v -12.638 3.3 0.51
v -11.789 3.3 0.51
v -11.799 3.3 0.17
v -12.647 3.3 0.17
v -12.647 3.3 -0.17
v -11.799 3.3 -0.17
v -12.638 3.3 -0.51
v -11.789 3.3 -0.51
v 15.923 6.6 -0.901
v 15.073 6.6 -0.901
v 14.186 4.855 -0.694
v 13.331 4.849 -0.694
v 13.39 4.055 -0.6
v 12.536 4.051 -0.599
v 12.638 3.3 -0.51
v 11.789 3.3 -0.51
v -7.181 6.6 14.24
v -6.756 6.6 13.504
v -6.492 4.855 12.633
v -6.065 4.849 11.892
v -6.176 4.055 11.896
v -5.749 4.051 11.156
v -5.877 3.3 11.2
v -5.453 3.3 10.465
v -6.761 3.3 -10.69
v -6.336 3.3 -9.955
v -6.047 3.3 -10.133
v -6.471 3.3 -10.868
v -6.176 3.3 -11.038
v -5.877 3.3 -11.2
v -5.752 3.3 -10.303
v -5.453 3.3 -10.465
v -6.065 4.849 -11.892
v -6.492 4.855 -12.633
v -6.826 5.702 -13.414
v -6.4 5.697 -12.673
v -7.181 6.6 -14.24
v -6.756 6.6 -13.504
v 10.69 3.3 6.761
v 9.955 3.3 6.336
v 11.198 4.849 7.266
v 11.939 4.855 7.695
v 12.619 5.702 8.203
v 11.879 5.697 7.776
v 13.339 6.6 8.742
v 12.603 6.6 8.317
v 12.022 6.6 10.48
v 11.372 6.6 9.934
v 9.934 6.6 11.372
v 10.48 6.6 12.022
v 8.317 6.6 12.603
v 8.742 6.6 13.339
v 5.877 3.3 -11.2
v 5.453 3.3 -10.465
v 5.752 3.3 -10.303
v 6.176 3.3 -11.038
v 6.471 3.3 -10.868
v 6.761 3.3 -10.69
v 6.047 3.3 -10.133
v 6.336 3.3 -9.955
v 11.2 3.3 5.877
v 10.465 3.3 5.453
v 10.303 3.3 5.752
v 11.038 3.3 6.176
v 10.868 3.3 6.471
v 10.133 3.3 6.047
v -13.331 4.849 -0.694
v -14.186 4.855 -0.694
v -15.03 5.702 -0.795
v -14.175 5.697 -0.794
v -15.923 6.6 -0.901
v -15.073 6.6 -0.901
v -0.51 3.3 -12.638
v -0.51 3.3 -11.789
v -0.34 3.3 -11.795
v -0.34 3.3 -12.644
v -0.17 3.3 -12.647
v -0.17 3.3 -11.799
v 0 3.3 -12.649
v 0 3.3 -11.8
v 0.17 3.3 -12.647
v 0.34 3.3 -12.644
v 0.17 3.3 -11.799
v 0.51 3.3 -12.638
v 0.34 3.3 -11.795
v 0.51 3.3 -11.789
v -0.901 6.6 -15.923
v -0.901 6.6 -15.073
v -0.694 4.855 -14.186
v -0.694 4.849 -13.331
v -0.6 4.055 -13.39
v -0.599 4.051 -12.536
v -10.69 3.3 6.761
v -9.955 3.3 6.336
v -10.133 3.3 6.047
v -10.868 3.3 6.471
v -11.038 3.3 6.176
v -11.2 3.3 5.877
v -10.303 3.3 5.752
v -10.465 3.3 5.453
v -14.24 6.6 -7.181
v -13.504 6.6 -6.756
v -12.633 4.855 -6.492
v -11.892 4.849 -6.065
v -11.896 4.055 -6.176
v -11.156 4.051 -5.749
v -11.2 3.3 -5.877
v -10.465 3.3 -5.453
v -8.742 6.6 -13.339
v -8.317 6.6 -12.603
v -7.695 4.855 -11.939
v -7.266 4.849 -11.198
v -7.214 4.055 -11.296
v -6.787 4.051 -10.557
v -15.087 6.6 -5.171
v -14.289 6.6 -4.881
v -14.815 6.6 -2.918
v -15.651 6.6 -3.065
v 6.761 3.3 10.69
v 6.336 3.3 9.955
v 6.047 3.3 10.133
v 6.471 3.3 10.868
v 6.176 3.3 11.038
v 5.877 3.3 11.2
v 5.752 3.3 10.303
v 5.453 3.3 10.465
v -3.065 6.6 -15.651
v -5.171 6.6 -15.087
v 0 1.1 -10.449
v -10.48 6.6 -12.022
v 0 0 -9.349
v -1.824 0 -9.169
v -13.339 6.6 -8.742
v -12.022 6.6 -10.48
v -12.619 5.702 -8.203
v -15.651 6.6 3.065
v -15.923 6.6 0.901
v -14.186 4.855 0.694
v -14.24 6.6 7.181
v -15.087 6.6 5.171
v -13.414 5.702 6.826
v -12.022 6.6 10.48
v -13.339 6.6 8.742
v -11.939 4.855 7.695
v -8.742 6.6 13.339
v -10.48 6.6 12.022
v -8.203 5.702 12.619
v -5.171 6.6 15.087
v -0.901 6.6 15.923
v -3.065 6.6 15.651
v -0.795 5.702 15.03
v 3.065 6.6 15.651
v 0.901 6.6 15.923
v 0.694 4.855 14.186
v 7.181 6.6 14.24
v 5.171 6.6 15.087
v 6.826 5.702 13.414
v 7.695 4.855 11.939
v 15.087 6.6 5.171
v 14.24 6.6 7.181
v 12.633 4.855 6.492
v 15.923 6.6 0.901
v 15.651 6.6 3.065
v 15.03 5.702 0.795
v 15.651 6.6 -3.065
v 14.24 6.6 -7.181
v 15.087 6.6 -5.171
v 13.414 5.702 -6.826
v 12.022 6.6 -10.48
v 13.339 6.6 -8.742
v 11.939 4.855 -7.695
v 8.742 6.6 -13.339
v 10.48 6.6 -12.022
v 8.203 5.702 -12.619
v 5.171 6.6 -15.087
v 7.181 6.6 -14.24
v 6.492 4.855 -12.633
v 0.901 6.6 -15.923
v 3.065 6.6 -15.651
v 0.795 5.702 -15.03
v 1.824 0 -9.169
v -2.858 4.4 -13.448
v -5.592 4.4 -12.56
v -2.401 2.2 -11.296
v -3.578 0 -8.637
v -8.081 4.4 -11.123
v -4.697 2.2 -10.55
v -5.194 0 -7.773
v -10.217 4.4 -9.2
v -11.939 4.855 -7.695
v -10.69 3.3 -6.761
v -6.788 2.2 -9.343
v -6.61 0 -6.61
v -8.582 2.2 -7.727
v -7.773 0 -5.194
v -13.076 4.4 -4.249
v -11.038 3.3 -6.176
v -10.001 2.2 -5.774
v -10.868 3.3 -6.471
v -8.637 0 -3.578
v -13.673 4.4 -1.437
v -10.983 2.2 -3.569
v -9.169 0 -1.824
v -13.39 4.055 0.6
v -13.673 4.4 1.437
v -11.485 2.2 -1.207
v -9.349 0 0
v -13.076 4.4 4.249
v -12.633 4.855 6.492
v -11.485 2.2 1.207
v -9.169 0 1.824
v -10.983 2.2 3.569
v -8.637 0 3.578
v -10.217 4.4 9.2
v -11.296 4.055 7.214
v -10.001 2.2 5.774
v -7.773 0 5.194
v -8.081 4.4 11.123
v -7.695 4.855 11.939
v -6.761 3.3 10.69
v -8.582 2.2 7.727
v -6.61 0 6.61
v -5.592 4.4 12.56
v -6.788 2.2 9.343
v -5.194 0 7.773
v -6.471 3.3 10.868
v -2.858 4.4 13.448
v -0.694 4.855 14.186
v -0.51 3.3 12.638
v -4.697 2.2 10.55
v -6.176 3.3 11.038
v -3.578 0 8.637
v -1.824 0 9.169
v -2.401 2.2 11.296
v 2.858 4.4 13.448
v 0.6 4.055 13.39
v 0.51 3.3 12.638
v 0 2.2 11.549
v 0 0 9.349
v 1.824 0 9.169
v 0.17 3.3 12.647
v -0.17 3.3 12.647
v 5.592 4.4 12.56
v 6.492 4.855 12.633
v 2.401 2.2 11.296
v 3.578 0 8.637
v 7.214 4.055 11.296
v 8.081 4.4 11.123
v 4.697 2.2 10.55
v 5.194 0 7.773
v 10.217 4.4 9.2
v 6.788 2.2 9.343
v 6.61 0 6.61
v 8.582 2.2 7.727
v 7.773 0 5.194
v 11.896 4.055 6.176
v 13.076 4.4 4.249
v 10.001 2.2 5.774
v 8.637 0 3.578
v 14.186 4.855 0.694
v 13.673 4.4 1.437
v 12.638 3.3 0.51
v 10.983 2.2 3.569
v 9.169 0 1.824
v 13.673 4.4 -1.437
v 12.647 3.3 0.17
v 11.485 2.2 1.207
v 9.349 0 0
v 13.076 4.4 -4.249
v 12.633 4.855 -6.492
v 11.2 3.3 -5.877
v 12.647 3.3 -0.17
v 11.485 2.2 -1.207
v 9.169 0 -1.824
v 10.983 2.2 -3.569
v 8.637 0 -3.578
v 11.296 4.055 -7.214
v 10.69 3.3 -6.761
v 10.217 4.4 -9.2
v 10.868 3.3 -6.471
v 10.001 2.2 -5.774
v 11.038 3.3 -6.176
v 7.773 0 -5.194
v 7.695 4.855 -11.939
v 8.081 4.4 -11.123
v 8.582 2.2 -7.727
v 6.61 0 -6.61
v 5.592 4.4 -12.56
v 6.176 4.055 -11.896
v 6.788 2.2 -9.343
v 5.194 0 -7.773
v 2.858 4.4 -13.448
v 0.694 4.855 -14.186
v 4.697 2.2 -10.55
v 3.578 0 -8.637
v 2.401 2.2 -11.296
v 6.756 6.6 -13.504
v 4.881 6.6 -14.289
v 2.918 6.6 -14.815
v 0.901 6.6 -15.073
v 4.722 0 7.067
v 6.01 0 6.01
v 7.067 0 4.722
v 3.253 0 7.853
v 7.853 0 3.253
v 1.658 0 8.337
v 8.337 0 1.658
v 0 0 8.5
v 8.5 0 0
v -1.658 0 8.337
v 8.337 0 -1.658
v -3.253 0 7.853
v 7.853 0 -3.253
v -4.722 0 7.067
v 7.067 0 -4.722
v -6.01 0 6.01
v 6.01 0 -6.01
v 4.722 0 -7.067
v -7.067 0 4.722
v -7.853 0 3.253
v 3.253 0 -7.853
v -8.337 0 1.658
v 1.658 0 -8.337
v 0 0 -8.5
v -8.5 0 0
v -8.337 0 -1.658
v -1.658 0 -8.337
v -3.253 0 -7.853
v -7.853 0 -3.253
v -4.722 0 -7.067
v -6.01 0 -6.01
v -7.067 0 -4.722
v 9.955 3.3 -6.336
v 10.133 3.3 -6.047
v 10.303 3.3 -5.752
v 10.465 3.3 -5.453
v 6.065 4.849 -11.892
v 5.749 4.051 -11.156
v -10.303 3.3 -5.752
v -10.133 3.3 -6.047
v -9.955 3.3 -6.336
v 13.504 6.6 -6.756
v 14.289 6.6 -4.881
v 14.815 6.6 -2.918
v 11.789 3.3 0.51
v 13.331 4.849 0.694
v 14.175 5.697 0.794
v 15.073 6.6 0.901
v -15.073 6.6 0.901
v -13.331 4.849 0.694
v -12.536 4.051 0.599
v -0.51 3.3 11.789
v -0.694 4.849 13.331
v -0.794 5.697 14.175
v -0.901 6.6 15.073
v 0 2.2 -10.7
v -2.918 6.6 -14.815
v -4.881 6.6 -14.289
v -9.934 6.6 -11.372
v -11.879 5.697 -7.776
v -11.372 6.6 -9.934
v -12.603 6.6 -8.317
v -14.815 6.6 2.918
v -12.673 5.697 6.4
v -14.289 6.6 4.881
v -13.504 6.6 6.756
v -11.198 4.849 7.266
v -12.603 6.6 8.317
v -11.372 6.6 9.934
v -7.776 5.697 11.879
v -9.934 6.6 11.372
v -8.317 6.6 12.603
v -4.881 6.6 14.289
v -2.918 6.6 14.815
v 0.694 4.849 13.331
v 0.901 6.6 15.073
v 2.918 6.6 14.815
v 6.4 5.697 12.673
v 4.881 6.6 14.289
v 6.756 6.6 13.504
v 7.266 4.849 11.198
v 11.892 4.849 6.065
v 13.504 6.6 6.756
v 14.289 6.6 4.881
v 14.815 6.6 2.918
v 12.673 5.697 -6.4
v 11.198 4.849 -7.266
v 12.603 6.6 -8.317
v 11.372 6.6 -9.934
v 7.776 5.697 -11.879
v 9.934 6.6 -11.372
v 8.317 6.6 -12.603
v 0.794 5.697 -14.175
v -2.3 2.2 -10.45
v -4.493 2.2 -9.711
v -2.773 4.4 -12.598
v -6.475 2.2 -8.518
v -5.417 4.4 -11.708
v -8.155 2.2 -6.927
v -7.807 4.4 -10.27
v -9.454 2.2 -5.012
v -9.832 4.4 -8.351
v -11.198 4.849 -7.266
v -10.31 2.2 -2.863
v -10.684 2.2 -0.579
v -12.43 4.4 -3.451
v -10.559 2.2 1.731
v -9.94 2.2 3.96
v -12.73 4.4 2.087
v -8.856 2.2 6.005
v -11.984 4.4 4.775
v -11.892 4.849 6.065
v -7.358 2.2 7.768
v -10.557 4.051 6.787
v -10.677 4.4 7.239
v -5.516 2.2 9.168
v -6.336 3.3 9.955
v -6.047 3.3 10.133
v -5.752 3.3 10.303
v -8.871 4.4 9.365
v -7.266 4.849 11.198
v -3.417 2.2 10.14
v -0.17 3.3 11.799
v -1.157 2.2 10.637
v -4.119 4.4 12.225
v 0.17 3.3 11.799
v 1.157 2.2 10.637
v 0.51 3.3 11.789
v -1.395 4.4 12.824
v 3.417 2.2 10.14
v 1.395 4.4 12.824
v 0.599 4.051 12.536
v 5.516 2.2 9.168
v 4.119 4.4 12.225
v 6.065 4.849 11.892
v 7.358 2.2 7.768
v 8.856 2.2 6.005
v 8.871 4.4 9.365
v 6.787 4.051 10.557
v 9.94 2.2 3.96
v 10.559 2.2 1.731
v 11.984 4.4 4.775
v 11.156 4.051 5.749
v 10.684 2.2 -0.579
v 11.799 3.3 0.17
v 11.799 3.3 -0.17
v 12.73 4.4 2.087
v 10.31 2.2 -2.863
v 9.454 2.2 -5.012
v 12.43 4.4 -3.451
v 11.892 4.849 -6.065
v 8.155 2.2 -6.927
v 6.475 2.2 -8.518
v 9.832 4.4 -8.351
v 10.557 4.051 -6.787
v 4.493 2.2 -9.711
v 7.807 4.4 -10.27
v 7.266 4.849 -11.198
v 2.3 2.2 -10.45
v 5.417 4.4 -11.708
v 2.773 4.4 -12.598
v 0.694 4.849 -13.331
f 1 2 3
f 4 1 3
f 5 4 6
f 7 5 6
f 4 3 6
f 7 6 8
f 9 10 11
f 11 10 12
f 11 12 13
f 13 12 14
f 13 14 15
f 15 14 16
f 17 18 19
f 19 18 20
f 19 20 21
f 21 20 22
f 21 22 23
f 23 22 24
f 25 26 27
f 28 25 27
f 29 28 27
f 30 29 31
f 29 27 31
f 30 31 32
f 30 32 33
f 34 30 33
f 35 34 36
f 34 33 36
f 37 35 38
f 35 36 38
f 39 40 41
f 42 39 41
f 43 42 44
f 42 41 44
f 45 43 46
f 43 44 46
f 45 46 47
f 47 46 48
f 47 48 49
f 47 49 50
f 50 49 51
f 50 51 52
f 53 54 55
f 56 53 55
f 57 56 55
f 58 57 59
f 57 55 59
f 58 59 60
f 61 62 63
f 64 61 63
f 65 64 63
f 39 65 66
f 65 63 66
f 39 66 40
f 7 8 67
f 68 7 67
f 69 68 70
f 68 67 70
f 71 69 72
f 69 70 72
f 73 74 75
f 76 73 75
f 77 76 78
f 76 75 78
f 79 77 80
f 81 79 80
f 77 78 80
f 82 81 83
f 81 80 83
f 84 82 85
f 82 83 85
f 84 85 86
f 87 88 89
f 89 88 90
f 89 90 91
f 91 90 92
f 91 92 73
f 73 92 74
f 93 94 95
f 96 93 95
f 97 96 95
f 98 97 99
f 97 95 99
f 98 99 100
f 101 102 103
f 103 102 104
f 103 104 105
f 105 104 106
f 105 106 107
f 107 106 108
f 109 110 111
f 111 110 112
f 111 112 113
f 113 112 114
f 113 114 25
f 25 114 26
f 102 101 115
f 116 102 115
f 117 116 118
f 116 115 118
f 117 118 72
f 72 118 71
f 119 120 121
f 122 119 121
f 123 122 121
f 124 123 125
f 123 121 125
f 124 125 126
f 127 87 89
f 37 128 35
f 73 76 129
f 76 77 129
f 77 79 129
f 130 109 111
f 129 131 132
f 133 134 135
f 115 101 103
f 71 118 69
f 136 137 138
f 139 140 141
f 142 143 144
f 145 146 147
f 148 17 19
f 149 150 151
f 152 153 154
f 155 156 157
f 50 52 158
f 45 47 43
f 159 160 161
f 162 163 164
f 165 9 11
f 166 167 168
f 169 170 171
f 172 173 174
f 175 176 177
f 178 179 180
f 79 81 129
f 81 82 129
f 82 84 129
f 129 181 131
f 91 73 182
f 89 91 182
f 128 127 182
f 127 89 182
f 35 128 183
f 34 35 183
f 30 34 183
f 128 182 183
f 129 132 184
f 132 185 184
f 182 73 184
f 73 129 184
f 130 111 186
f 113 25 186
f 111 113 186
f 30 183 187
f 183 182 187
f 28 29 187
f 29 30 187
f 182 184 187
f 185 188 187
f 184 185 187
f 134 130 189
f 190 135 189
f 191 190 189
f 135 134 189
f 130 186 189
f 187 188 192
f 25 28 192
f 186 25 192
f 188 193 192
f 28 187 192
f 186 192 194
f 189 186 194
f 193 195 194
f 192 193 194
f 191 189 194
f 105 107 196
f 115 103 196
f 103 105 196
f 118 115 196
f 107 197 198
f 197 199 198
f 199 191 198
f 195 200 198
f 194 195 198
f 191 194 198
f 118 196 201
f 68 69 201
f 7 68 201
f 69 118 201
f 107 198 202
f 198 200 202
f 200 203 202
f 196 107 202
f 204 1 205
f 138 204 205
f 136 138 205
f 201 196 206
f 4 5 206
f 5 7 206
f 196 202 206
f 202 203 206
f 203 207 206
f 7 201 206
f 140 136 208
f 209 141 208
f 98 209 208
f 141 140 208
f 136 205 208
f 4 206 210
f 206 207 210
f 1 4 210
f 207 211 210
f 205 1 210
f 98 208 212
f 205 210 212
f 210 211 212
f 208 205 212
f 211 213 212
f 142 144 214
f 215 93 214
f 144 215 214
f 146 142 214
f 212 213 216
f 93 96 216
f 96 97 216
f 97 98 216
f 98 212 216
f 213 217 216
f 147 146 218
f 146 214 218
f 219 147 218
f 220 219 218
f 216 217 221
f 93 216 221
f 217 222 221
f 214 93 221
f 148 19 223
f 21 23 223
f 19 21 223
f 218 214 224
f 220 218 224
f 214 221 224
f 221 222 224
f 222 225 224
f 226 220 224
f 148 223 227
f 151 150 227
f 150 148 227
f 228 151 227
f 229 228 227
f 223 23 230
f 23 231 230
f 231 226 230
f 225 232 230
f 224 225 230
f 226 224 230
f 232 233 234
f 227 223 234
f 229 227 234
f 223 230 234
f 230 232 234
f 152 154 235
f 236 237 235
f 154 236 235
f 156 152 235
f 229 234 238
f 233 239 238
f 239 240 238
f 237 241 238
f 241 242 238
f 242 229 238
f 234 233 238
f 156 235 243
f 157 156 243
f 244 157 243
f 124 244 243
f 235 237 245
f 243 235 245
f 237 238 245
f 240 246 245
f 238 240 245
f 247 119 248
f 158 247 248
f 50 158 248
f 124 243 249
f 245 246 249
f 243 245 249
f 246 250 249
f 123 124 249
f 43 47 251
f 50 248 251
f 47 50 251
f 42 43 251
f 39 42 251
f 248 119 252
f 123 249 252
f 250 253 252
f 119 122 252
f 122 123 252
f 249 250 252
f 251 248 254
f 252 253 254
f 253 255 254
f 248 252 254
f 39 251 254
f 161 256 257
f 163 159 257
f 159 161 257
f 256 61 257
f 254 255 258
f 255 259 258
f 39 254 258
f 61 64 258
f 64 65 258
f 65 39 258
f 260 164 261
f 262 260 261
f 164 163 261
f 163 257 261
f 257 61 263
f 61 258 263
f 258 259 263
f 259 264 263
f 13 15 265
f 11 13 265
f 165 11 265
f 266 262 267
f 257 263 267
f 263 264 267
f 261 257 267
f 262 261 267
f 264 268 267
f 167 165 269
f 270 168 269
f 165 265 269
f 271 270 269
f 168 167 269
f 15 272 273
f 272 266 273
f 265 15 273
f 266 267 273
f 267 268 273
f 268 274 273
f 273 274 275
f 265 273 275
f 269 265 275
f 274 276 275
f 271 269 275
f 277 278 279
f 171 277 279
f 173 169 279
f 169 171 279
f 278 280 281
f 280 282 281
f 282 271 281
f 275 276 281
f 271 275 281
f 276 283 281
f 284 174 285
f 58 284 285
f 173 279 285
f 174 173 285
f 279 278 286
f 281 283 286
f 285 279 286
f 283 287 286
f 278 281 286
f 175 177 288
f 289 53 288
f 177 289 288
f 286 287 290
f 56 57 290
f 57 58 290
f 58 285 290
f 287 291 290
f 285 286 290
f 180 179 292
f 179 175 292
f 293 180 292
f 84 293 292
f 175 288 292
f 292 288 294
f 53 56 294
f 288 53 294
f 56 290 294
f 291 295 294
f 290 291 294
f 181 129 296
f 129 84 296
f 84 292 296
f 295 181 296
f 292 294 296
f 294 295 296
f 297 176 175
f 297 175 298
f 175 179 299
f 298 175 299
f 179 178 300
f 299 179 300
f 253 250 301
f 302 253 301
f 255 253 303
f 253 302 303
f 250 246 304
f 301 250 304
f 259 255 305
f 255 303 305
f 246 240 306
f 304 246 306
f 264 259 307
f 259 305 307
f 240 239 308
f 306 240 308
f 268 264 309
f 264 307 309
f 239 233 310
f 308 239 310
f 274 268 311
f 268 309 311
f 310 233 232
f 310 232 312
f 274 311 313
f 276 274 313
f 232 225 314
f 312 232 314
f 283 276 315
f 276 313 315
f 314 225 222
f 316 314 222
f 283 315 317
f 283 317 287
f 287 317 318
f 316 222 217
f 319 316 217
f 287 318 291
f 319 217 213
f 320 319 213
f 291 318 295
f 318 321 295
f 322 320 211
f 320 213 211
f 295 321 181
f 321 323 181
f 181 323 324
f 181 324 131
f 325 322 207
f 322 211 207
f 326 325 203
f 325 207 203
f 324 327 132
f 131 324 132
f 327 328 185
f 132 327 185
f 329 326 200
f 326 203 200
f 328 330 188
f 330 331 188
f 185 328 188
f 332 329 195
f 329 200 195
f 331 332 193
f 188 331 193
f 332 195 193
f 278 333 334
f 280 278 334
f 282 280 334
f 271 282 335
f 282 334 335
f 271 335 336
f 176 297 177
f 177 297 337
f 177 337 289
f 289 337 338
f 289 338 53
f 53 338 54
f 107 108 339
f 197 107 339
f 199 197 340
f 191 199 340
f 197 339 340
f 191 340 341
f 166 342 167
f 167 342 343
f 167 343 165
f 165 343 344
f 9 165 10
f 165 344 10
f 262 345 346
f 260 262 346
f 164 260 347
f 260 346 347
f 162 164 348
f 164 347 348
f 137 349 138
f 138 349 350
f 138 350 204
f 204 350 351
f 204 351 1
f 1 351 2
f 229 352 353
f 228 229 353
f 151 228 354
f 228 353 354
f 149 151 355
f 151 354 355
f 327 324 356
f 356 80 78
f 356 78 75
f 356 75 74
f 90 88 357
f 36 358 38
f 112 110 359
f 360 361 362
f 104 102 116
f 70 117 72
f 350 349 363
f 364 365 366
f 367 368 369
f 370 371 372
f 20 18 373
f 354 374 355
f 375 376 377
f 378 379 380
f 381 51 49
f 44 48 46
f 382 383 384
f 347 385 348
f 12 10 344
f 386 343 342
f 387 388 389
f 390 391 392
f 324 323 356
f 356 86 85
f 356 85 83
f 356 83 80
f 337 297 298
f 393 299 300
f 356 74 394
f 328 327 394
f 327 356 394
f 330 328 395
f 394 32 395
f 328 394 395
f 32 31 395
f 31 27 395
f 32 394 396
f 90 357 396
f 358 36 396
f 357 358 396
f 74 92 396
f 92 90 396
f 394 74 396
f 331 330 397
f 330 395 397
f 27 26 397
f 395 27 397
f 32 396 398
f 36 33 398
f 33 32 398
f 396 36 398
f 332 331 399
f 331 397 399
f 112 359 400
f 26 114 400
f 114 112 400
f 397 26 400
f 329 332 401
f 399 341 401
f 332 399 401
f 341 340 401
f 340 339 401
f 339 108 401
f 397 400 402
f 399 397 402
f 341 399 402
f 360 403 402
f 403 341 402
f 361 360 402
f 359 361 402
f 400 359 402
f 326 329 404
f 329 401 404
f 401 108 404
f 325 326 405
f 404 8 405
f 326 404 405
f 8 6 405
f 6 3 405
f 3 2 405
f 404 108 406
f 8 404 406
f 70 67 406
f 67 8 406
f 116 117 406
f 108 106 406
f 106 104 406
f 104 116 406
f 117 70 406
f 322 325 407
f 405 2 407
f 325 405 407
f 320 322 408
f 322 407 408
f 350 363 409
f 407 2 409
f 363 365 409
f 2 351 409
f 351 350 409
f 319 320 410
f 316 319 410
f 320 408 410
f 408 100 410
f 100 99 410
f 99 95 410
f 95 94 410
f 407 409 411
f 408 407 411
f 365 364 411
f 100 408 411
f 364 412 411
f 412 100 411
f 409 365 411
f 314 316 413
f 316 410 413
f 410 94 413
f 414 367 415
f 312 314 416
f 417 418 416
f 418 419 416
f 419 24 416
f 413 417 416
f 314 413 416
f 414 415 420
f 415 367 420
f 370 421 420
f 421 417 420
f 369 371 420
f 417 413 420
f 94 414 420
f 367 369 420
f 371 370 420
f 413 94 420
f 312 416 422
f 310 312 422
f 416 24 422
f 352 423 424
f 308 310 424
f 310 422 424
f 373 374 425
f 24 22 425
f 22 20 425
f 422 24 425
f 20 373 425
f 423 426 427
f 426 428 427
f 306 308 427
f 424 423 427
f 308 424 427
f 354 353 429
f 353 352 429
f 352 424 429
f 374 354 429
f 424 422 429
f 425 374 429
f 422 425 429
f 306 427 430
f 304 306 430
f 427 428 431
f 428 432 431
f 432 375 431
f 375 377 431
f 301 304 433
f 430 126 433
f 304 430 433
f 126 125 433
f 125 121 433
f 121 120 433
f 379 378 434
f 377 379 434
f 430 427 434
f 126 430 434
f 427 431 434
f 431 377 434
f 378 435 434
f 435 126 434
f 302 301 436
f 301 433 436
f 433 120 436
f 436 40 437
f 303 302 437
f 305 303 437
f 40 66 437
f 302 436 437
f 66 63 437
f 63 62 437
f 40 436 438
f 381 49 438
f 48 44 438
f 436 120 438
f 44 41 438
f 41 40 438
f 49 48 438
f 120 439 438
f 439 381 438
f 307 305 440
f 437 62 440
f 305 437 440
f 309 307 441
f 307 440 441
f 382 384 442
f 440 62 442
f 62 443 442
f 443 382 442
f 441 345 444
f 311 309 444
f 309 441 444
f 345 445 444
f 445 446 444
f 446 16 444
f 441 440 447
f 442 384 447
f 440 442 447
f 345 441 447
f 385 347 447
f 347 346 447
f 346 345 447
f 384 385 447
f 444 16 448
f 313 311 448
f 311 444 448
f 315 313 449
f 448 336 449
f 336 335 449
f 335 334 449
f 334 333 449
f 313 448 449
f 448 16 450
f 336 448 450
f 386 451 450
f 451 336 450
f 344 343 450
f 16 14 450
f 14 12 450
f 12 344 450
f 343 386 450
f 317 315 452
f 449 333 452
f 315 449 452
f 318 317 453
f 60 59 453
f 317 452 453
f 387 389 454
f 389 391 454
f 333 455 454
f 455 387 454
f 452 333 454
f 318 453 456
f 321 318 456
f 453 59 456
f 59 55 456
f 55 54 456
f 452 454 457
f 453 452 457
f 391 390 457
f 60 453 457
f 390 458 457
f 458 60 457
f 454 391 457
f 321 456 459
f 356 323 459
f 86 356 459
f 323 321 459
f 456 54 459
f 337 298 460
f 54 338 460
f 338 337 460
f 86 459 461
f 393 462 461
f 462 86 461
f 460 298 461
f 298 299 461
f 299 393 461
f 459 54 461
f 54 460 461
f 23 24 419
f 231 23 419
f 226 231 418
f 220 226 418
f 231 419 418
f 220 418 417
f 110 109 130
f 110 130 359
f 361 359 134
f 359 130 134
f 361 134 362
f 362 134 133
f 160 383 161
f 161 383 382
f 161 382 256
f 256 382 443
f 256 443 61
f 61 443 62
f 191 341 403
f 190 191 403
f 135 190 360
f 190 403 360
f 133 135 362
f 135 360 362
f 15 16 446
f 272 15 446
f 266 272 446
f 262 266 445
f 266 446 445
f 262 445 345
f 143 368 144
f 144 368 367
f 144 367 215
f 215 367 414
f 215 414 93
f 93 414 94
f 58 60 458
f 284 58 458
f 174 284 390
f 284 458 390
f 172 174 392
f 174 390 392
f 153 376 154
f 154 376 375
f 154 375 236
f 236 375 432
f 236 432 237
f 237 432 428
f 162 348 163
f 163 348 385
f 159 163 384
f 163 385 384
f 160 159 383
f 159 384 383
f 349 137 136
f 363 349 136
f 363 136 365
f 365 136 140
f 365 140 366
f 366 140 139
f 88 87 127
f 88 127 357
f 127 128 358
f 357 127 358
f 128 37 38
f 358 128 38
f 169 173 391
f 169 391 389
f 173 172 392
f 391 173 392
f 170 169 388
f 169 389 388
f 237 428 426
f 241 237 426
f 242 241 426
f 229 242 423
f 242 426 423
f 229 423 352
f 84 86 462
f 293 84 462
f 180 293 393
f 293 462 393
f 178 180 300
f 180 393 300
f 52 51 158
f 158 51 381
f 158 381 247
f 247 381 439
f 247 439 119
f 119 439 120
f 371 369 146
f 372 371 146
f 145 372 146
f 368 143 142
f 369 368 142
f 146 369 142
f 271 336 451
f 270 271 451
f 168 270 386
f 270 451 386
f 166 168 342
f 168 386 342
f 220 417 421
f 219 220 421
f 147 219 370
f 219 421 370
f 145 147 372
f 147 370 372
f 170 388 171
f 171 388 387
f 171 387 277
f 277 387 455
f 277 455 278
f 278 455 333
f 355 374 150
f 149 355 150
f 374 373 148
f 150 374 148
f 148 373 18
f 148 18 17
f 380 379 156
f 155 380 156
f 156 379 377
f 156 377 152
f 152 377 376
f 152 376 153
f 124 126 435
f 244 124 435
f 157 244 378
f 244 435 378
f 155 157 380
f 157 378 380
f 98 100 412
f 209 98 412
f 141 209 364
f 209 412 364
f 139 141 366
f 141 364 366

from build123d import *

# Parameters (mm, degrees)
CUT_EXTRUDE1_DEPTH = 24.500448921
CIRPATTERN1_COUNT  = 12


with BuildPart() as part:
    # Sketch1 → Base-Revolve (revolve)
    with BuildSketch(Plane(origin=(0, 0, 0), x_dir=(0, 0, -1), z_dir=(1, 0, 0))):
        Polygon((8.5, 0), (15.1, 6.6), (15.948528137, 6.6), (9.348528137, 0), align=None)
    revolve(axis=Axis((0, -30, 0), (0, 1, 0)))

    # Sketch2 → Cut-Extrude1 (cut, through all)
    with BuildSketch(Plane.XY):
        Polygon((-0.51, 3.3), (0.51, 3.3), (1.02, 7.6), (-1.02, 7.6), align=None)
    cut_extrude1 = extrude(amount=-CUT_EXTRUDE1_DEPTH, mode=Mode.SUBTRACT)

    # CirPattern1: Cut-Extrude1 ×12 about axis
    cirpattern1_axis = Axis((0, 0, 0), (0, 1, 0))
    for i in range(1, CIRPATTERN1_COUNT):
        add(cut_extrude1.rotate(cirpattern1_axis, i * 360 / CIRPATTERN1_COUNT), mode=Mode.SUBTRACT)


solid = part.part
